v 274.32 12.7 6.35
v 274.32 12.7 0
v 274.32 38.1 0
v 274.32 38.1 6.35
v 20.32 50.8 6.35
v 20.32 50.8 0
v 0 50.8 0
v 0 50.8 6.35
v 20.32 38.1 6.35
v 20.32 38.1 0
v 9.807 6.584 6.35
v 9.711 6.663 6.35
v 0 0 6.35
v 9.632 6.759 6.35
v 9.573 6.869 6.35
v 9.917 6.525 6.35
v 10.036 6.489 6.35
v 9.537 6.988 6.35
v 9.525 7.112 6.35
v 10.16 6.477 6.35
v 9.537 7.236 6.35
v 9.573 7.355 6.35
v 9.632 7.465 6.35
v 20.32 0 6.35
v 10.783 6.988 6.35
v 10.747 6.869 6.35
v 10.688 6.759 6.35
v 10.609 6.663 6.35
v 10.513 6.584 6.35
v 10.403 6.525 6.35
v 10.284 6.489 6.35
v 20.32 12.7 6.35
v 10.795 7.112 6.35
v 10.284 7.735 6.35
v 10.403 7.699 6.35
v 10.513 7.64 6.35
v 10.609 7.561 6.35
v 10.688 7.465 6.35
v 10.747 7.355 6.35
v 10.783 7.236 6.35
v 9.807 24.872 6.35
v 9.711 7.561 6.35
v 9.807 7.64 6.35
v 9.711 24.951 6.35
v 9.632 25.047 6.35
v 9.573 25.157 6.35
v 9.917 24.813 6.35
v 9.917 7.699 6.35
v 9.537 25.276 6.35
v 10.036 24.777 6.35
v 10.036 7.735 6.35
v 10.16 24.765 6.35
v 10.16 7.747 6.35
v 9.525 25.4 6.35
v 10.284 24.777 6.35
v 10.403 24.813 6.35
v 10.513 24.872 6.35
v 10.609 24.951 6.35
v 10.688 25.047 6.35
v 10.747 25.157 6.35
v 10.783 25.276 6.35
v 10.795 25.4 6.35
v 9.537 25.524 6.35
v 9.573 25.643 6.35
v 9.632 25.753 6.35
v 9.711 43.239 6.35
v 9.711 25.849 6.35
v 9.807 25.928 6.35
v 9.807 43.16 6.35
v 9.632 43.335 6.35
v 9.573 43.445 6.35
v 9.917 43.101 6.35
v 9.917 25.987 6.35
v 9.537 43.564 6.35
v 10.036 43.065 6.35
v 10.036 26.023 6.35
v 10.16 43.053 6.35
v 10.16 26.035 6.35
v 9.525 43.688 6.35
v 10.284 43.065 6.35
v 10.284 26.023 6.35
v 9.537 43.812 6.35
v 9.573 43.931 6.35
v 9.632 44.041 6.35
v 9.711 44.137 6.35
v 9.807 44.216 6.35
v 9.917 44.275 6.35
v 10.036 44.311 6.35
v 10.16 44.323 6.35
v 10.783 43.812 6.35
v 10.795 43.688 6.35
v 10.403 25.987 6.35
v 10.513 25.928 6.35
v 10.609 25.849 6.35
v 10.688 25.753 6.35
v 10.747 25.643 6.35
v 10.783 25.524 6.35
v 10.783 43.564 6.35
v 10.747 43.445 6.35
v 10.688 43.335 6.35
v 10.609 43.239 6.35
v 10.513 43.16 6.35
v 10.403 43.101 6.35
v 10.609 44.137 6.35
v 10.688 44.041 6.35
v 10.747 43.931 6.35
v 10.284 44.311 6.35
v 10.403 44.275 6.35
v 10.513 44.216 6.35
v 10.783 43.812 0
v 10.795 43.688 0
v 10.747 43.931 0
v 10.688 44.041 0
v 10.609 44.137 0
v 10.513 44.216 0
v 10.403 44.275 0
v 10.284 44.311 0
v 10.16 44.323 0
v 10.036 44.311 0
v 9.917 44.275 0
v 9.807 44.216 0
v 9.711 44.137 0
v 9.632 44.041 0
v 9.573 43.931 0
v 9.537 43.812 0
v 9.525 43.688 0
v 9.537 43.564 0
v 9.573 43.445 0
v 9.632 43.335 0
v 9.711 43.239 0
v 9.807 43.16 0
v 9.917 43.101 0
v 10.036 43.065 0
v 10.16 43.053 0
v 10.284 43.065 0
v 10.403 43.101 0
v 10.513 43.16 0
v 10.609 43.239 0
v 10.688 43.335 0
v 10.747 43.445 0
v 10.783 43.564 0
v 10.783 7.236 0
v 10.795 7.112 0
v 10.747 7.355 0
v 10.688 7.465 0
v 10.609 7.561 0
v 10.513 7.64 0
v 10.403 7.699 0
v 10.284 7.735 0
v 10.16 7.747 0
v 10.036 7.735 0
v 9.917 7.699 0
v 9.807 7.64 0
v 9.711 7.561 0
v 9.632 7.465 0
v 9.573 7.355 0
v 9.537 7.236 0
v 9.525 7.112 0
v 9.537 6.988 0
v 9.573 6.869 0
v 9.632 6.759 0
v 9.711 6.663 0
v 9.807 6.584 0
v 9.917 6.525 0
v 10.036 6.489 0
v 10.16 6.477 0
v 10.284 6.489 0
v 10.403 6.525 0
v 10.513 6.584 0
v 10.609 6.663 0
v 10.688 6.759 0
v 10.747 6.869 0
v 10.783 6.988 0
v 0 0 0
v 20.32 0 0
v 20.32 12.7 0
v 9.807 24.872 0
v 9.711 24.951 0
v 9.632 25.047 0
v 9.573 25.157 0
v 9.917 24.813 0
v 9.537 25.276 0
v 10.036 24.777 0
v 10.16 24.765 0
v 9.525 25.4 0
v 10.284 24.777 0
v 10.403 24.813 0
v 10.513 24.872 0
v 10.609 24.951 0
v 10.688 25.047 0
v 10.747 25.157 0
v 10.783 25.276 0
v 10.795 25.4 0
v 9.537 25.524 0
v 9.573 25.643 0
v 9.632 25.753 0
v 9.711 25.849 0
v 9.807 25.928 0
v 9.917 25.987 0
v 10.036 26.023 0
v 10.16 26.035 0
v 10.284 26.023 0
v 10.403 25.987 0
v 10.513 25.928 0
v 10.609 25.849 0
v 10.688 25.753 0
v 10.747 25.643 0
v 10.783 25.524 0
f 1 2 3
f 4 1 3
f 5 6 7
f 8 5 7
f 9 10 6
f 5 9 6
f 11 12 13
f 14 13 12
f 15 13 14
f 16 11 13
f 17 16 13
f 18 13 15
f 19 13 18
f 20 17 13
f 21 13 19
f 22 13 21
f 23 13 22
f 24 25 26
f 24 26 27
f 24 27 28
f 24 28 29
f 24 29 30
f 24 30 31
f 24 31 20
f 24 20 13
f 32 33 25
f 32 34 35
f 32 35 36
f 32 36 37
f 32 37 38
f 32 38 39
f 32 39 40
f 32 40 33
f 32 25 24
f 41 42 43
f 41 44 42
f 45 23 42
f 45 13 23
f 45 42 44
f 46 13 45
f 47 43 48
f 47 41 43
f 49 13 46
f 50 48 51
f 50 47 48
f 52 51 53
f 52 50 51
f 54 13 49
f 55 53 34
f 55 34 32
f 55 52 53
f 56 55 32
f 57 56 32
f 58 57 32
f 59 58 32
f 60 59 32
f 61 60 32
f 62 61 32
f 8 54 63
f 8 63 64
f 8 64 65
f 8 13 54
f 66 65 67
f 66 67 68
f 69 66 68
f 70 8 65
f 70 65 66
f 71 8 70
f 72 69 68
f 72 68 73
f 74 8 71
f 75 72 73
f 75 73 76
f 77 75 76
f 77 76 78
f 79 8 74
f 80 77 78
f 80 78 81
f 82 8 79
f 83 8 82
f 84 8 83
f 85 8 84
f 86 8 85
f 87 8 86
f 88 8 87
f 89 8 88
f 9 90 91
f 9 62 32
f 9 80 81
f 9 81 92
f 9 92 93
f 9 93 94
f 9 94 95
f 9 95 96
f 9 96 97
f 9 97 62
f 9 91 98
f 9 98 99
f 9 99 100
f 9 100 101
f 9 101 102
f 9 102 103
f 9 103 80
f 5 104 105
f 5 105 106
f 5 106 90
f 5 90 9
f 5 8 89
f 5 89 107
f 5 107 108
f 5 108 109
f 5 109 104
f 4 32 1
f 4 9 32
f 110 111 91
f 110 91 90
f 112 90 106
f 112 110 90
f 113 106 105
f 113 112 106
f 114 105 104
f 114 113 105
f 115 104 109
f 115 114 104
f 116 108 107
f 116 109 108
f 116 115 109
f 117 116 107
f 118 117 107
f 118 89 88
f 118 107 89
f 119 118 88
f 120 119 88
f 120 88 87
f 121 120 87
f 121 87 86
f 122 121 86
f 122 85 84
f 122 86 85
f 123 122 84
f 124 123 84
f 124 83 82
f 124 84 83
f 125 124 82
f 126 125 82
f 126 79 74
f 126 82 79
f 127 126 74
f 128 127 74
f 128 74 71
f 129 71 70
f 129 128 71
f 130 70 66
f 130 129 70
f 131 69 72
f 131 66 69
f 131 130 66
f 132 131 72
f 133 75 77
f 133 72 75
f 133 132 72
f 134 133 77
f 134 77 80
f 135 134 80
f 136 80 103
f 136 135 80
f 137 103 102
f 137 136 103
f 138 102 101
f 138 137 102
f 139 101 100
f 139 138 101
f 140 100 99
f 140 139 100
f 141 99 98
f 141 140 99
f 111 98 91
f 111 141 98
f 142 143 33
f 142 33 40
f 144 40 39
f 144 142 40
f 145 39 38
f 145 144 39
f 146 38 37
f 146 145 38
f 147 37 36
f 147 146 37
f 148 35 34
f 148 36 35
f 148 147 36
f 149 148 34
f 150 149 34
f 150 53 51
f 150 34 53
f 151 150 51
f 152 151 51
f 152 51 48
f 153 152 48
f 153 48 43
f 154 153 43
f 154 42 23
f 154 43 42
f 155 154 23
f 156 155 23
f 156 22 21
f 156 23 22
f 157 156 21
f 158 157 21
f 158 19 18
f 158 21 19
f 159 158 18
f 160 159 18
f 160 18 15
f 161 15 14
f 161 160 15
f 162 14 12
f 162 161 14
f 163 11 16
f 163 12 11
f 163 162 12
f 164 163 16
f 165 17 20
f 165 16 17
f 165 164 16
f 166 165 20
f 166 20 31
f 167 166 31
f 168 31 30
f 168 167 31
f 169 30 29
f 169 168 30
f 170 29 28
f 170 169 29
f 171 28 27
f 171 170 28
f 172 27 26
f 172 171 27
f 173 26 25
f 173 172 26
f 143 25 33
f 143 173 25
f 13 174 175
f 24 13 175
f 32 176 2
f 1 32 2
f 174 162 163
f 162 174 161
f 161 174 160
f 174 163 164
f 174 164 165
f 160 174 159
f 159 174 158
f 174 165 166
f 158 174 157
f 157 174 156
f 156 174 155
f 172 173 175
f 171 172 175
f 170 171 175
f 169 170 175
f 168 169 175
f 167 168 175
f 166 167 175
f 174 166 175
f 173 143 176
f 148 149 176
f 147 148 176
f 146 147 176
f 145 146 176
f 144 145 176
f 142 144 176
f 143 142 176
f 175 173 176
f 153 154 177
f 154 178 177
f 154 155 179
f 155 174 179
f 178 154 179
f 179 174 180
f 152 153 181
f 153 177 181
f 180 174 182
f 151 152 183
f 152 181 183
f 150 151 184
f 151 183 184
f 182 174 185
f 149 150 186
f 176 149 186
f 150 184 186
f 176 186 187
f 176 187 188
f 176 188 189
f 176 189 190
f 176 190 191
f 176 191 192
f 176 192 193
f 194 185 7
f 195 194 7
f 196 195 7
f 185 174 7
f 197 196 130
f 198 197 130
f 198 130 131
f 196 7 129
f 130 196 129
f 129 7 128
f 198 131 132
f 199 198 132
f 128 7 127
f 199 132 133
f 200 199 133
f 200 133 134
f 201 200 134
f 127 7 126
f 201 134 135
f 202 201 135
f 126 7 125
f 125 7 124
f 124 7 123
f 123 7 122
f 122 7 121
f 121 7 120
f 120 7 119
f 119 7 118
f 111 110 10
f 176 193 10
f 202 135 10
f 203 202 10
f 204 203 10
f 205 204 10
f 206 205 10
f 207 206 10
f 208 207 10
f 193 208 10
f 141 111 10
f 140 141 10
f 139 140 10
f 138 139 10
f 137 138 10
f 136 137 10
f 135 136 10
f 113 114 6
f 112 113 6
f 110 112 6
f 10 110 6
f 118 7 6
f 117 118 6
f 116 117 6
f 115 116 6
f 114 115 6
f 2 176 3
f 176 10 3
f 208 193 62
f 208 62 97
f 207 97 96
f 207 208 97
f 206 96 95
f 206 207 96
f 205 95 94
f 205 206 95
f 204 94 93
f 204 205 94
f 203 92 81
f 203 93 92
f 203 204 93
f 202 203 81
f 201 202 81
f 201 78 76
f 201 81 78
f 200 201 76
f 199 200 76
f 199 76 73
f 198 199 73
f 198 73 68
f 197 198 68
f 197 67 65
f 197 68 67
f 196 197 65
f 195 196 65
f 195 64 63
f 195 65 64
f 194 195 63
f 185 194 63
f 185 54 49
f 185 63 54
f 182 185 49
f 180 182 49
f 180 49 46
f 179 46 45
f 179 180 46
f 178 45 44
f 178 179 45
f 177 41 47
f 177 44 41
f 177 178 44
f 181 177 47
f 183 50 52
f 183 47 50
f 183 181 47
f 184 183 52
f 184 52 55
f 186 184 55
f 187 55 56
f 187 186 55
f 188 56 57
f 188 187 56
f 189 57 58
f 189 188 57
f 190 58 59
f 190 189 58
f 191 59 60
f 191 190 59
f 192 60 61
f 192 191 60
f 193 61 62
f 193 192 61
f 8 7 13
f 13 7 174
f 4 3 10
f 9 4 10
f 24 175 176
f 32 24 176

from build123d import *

# Parameters (mm, degrees)
BOSS_EXTRUDE1_DEPTH     = 6.35
CUT_EXTRUDE1_DEPTH      = 280.056311342
CUT_EXTRUDE1_DEPTH_BACK = 280.056311342
SKETCH2_R               = 0.635


with BuildPart() as part:
    # Sketch1 → Boss-Extrude1 (new body)
    with BuildSketch(Plane.XY):
        Polygon((0, 0), (20.32, 0), (20.32, 12.7), (274.32, 12.7), (274.32, 38.1), (20.32, 38.1), (20.32, 50.8), (0, 50.8), align=None)
    extrude(amount=BOSS_EXTRUDE1_DEPTH)

    # Sketch2 → Cut-Extrude1 (cut, two sides: drawn at the far end of the back side and taken through both)
    with BuildSketch(Plane.XY.offset(6.35).offset(-CUT_EXTRUDE1_DEPTH_BACK)):
        with Locations((10.16, 43.688)):
            Circle(SKETCH2_R)
        with Locations((10.16, 25.4)):
            Circle(SKETCH2_R)
        with Locations((10.16, 7.112)):
            Circle(SKETCH2_R)
    extrude(amount=CUT_EXTRUDE1_DEPTH + CUT_EXTRUDE1_DEPTH_BACK, mode=Mode.SUBTRACT)


solid = part.part
